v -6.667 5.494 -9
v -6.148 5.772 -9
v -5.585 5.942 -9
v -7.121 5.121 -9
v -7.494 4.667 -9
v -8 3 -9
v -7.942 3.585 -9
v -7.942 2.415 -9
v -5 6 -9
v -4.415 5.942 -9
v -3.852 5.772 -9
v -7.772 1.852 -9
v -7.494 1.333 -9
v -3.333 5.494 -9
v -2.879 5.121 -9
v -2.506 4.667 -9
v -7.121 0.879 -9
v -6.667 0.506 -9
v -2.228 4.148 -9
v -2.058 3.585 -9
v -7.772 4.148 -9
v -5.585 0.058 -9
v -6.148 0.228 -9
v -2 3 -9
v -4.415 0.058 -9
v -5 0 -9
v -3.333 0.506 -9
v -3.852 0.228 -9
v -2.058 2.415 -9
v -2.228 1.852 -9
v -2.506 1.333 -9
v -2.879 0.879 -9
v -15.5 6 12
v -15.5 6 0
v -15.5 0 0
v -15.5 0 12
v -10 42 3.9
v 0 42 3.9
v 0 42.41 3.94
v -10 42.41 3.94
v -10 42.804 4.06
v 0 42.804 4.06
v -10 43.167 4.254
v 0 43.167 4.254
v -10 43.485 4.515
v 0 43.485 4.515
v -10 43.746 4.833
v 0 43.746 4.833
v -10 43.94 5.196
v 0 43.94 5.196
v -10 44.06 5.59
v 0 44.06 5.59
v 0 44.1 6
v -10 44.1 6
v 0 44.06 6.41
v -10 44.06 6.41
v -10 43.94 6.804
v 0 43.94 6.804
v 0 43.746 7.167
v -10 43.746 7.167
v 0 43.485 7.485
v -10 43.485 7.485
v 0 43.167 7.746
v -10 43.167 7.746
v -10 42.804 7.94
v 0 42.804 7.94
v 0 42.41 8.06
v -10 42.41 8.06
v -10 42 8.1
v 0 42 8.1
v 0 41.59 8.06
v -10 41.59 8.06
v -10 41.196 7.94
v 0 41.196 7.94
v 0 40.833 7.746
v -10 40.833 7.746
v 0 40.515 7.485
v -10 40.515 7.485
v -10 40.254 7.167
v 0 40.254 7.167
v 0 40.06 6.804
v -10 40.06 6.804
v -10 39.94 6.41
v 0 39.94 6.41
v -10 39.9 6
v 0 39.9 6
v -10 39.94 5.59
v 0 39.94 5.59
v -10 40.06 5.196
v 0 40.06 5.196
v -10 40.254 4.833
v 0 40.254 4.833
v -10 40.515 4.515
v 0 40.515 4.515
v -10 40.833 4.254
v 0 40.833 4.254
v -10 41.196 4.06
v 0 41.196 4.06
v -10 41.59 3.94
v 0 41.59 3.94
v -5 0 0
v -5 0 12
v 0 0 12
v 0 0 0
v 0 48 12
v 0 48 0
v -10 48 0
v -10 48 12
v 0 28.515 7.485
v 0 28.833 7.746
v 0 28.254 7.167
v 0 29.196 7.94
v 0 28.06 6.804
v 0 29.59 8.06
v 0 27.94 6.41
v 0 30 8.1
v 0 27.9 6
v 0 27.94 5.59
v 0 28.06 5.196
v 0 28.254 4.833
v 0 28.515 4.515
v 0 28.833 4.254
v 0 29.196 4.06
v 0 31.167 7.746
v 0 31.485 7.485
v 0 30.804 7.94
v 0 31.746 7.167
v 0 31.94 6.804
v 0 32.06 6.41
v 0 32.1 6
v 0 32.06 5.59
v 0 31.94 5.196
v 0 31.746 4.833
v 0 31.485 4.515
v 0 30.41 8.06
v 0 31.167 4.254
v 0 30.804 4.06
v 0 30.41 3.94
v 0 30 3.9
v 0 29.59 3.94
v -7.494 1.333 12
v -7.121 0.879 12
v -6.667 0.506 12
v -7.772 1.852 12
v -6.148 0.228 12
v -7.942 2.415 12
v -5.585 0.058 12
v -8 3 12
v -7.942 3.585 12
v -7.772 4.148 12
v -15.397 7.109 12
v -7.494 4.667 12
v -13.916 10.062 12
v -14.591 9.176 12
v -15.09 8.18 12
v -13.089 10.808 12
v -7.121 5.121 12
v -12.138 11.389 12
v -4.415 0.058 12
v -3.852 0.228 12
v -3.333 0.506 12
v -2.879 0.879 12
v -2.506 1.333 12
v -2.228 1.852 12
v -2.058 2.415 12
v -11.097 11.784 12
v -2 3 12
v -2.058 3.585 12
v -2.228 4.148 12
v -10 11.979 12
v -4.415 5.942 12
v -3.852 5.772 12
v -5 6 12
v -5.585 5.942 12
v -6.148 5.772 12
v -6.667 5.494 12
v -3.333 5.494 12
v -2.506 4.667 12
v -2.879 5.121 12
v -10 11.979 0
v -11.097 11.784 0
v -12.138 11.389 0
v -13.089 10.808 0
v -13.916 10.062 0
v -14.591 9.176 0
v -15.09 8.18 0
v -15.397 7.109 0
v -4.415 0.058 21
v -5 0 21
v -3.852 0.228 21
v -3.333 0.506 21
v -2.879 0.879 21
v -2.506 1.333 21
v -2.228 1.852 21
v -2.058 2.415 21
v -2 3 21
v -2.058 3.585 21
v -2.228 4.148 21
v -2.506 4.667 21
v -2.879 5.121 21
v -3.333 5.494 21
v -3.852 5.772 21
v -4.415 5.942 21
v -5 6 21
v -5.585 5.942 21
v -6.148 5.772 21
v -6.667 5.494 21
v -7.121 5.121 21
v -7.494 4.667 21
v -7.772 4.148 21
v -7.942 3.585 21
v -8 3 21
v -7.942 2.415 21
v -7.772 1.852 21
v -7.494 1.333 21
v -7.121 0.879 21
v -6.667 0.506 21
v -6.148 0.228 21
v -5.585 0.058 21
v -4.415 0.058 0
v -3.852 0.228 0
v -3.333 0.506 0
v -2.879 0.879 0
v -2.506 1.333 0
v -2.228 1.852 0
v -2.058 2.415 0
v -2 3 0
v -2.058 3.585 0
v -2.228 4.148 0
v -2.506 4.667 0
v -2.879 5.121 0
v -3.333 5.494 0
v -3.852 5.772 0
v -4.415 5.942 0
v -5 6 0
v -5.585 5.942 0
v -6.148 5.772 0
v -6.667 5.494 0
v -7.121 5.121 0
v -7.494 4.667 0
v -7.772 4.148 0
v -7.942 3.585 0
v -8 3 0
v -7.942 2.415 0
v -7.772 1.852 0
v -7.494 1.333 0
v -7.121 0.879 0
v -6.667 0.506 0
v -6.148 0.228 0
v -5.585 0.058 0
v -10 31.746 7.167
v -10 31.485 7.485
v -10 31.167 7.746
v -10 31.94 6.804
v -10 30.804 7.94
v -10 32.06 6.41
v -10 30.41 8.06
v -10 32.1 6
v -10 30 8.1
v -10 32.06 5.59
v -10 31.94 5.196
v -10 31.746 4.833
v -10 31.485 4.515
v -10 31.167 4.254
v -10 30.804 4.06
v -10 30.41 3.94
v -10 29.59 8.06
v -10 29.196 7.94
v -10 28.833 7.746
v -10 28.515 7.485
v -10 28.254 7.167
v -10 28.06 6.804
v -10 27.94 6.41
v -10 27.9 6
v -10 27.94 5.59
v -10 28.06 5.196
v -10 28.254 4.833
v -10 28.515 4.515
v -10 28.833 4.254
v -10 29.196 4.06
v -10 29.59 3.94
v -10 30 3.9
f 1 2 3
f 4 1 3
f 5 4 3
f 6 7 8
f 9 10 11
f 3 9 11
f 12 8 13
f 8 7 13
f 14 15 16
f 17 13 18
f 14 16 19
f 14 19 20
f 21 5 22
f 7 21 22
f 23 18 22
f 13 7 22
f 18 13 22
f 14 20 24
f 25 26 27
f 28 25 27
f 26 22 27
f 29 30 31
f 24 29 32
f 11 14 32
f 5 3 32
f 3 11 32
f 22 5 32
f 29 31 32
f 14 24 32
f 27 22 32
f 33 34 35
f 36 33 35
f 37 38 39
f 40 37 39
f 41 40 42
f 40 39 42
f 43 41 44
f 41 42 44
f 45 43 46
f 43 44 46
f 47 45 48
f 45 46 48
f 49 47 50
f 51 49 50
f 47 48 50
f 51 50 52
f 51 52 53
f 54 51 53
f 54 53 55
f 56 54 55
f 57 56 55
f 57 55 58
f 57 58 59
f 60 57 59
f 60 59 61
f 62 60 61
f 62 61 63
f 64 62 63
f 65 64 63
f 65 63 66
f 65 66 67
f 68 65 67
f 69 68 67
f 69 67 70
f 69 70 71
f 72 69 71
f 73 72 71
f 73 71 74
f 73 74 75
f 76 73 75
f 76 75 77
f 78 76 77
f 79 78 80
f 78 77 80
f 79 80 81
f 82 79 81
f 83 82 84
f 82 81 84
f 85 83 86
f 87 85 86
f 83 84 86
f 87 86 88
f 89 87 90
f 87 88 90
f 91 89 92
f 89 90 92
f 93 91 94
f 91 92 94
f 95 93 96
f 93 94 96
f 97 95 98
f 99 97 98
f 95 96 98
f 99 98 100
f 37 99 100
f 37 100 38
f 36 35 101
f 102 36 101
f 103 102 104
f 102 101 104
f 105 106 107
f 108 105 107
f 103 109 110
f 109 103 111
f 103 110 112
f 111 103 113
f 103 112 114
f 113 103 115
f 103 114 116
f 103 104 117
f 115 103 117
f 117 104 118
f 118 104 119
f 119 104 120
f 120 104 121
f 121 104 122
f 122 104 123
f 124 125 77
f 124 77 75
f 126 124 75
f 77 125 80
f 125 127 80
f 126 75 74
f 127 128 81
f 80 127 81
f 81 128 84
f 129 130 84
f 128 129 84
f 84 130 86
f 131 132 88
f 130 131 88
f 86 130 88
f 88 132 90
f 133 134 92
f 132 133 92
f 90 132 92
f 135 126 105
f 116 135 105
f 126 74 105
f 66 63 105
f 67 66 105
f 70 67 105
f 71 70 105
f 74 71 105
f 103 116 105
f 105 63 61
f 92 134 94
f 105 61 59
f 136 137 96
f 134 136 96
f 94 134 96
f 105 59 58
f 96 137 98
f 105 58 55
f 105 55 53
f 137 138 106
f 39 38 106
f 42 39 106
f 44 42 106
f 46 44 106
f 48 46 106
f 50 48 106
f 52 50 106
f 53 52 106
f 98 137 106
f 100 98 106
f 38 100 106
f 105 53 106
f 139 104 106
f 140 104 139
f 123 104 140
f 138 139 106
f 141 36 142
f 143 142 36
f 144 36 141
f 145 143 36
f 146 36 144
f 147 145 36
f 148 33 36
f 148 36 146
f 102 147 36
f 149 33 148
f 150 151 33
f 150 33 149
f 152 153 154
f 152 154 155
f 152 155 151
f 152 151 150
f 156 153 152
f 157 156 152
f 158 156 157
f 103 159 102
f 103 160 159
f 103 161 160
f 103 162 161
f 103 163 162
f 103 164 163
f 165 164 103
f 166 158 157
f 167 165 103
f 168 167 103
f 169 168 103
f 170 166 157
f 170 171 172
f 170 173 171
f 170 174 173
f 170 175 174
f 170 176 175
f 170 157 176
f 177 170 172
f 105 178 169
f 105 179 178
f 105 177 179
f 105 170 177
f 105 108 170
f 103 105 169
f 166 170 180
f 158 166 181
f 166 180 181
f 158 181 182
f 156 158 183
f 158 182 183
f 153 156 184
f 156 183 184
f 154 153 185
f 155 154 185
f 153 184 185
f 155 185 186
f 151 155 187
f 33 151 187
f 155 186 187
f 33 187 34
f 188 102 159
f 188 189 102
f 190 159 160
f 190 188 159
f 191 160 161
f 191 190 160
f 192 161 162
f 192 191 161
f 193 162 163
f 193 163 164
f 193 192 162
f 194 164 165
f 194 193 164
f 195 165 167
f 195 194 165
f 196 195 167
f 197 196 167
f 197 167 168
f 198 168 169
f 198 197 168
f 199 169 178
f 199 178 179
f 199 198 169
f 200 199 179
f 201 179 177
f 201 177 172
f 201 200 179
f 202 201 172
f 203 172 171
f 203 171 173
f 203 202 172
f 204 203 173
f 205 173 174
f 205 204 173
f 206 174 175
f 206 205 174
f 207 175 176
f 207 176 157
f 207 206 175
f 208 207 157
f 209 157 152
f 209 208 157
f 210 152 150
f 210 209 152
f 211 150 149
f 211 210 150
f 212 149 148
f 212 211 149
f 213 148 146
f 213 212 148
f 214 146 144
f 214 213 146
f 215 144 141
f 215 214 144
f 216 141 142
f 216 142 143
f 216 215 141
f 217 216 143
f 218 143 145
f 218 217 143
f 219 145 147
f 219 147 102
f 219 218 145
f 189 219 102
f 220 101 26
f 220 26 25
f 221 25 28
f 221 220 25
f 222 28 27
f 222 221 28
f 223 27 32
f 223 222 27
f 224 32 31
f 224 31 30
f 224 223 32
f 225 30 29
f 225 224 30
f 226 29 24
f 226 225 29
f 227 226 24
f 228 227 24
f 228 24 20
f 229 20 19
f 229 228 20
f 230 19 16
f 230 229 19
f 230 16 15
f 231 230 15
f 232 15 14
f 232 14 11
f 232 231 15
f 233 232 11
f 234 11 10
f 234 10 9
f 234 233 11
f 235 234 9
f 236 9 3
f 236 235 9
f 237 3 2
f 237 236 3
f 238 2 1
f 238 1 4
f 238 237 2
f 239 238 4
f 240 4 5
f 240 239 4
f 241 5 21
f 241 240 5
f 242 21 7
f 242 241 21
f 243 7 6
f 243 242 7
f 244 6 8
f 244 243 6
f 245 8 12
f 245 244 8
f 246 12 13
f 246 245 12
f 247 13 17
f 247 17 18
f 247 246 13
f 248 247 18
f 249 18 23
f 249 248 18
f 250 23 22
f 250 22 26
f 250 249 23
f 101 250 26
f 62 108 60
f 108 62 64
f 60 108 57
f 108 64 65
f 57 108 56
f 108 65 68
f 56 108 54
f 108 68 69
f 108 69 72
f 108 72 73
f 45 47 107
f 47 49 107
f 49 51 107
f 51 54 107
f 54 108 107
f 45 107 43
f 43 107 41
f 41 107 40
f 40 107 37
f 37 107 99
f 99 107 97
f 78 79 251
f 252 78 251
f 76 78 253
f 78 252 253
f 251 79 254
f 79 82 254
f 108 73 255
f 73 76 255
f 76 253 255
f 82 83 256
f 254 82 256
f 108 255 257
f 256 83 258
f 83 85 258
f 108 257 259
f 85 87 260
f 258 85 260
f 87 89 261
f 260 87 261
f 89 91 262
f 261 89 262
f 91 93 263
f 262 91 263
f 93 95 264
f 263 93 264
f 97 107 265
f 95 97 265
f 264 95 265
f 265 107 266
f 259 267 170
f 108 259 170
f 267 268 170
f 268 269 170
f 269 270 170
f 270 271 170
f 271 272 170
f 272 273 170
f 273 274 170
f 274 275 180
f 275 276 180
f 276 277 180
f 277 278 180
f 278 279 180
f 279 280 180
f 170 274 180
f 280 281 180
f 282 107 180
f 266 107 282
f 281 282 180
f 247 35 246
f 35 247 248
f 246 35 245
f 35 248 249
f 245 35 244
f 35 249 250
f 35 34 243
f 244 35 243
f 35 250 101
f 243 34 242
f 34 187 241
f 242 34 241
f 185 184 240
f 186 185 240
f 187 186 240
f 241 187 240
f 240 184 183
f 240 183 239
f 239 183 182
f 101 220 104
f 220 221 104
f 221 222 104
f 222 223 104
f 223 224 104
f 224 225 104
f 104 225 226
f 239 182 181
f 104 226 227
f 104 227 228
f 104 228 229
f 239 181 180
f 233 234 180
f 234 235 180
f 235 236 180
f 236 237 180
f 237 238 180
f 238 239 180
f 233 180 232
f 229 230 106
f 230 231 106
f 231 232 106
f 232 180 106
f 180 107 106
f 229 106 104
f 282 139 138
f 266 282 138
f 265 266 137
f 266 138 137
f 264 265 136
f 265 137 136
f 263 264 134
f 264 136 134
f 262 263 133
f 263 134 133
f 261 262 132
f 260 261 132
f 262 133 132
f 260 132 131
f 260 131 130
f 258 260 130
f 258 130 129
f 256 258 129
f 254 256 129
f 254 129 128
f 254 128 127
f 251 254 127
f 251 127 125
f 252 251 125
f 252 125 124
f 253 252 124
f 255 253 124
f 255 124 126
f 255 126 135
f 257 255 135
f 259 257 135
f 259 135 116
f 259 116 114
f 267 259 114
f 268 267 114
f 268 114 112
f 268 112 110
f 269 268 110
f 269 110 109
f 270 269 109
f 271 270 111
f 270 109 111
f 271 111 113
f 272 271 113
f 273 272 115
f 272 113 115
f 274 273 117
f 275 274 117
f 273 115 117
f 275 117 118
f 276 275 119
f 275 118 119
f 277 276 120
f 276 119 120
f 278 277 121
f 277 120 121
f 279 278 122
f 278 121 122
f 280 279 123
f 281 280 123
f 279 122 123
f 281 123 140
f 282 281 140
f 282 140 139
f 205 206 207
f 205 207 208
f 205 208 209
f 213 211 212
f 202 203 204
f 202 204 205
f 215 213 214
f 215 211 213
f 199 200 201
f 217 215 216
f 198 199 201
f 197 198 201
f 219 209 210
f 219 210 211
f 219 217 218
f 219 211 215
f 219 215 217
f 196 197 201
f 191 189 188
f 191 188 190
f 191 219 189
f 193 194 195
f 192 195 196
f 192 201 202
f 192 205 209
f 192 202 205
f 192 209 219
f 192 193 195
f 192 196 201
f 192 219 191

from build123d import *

# Parameters (mm, degrees)
BASE_EXTRUDE_DEPTH = 12
SKETCH4_R          = 3
PIVOTPIN_DEPTH     = 15
M5_X_0_8_1_D       = 4.2
M5_X_0_8_1_DEPTH   = 12
M5_X_0_8_1_TIP     = 1.2618073
M5_DRILLED2_D      = 4.2
M5_DRILLED2_DEPTH  = 12
M5_DRILLED2_TIP    = 1.2618073


with BuildPart() as part:
    # Sketch3 → Base-Extrude (new body)
    with BuildSketch(Plane.XY):
        with BuildLine():
            Line((-15.5, 0), (0, 0))
            Line((0, 0), (0, 48))
            Line((0, 48), (-10, 48))
            Line((-10, 48), (-10, 11.979130372))
            ThreePointArc((-10, 11.979130372), (-13.915880433, 10.062019202), (-15.5, 6))
            Line((-15.5, 6), (-15.5, 0))
        make_face()
    extrude(amount=BASE_EXTRUDE_DEPTH)

    # Sketch4 → PivotPin (add, symmetric)
    with BuildSketch(Plane.XY.offset(6)):
        with Locations(Location((-5, 3, 0), (0, 0, 270))):
            Circle(SKETCH4_R)
    extrude(amount=PIVOTPIN_DEPTH, both=True)

    # M5 x 0.8 #1
    with Locations(Plane(origin=(-10, -42.79947187, 57.720392954), x_dir=(0, 0, 1), z_dir=(-1, 0, 0))):
        with Locations((-51.720392954, 84.79947187)):
            Hole(M5_X_0_8_1_D / 2, depth=M5_X_0_8_1_DEPTH)
            with Locations((0, 0, -(M5_X_0_8_1_DEPTH + M5_X_0_8_1_TIP / 2))):  # 118° drill point
                Cone(0, M5_X_0_8_1_D / 2, M5_X_0_8_1_TIP, mode=Mode.SUBTRACT)

    # M5 Drilled2
    with Locations(Plane(origin=(-10, -44.641735567, 57.583928977), x_dir=(0, 0, 1), z_dir=(-1, 0, 0))):
        with Locations((-51.583928977, 74.641735567)):
            Hole(M5_DRILLED2_D / 2, depth=M5_DRILLED2_DEPTH)
            with Locations((0, 0, -(M5_DRILLED2_DEPTH + M5_DRILLED2_TIP / 2))):  # 118° drill point
                Cone(0, M5_DRILLED2_D / 2, M5_DRILLED2_TIP, mode=Mode.SUBTRACT)


solid = part.part
